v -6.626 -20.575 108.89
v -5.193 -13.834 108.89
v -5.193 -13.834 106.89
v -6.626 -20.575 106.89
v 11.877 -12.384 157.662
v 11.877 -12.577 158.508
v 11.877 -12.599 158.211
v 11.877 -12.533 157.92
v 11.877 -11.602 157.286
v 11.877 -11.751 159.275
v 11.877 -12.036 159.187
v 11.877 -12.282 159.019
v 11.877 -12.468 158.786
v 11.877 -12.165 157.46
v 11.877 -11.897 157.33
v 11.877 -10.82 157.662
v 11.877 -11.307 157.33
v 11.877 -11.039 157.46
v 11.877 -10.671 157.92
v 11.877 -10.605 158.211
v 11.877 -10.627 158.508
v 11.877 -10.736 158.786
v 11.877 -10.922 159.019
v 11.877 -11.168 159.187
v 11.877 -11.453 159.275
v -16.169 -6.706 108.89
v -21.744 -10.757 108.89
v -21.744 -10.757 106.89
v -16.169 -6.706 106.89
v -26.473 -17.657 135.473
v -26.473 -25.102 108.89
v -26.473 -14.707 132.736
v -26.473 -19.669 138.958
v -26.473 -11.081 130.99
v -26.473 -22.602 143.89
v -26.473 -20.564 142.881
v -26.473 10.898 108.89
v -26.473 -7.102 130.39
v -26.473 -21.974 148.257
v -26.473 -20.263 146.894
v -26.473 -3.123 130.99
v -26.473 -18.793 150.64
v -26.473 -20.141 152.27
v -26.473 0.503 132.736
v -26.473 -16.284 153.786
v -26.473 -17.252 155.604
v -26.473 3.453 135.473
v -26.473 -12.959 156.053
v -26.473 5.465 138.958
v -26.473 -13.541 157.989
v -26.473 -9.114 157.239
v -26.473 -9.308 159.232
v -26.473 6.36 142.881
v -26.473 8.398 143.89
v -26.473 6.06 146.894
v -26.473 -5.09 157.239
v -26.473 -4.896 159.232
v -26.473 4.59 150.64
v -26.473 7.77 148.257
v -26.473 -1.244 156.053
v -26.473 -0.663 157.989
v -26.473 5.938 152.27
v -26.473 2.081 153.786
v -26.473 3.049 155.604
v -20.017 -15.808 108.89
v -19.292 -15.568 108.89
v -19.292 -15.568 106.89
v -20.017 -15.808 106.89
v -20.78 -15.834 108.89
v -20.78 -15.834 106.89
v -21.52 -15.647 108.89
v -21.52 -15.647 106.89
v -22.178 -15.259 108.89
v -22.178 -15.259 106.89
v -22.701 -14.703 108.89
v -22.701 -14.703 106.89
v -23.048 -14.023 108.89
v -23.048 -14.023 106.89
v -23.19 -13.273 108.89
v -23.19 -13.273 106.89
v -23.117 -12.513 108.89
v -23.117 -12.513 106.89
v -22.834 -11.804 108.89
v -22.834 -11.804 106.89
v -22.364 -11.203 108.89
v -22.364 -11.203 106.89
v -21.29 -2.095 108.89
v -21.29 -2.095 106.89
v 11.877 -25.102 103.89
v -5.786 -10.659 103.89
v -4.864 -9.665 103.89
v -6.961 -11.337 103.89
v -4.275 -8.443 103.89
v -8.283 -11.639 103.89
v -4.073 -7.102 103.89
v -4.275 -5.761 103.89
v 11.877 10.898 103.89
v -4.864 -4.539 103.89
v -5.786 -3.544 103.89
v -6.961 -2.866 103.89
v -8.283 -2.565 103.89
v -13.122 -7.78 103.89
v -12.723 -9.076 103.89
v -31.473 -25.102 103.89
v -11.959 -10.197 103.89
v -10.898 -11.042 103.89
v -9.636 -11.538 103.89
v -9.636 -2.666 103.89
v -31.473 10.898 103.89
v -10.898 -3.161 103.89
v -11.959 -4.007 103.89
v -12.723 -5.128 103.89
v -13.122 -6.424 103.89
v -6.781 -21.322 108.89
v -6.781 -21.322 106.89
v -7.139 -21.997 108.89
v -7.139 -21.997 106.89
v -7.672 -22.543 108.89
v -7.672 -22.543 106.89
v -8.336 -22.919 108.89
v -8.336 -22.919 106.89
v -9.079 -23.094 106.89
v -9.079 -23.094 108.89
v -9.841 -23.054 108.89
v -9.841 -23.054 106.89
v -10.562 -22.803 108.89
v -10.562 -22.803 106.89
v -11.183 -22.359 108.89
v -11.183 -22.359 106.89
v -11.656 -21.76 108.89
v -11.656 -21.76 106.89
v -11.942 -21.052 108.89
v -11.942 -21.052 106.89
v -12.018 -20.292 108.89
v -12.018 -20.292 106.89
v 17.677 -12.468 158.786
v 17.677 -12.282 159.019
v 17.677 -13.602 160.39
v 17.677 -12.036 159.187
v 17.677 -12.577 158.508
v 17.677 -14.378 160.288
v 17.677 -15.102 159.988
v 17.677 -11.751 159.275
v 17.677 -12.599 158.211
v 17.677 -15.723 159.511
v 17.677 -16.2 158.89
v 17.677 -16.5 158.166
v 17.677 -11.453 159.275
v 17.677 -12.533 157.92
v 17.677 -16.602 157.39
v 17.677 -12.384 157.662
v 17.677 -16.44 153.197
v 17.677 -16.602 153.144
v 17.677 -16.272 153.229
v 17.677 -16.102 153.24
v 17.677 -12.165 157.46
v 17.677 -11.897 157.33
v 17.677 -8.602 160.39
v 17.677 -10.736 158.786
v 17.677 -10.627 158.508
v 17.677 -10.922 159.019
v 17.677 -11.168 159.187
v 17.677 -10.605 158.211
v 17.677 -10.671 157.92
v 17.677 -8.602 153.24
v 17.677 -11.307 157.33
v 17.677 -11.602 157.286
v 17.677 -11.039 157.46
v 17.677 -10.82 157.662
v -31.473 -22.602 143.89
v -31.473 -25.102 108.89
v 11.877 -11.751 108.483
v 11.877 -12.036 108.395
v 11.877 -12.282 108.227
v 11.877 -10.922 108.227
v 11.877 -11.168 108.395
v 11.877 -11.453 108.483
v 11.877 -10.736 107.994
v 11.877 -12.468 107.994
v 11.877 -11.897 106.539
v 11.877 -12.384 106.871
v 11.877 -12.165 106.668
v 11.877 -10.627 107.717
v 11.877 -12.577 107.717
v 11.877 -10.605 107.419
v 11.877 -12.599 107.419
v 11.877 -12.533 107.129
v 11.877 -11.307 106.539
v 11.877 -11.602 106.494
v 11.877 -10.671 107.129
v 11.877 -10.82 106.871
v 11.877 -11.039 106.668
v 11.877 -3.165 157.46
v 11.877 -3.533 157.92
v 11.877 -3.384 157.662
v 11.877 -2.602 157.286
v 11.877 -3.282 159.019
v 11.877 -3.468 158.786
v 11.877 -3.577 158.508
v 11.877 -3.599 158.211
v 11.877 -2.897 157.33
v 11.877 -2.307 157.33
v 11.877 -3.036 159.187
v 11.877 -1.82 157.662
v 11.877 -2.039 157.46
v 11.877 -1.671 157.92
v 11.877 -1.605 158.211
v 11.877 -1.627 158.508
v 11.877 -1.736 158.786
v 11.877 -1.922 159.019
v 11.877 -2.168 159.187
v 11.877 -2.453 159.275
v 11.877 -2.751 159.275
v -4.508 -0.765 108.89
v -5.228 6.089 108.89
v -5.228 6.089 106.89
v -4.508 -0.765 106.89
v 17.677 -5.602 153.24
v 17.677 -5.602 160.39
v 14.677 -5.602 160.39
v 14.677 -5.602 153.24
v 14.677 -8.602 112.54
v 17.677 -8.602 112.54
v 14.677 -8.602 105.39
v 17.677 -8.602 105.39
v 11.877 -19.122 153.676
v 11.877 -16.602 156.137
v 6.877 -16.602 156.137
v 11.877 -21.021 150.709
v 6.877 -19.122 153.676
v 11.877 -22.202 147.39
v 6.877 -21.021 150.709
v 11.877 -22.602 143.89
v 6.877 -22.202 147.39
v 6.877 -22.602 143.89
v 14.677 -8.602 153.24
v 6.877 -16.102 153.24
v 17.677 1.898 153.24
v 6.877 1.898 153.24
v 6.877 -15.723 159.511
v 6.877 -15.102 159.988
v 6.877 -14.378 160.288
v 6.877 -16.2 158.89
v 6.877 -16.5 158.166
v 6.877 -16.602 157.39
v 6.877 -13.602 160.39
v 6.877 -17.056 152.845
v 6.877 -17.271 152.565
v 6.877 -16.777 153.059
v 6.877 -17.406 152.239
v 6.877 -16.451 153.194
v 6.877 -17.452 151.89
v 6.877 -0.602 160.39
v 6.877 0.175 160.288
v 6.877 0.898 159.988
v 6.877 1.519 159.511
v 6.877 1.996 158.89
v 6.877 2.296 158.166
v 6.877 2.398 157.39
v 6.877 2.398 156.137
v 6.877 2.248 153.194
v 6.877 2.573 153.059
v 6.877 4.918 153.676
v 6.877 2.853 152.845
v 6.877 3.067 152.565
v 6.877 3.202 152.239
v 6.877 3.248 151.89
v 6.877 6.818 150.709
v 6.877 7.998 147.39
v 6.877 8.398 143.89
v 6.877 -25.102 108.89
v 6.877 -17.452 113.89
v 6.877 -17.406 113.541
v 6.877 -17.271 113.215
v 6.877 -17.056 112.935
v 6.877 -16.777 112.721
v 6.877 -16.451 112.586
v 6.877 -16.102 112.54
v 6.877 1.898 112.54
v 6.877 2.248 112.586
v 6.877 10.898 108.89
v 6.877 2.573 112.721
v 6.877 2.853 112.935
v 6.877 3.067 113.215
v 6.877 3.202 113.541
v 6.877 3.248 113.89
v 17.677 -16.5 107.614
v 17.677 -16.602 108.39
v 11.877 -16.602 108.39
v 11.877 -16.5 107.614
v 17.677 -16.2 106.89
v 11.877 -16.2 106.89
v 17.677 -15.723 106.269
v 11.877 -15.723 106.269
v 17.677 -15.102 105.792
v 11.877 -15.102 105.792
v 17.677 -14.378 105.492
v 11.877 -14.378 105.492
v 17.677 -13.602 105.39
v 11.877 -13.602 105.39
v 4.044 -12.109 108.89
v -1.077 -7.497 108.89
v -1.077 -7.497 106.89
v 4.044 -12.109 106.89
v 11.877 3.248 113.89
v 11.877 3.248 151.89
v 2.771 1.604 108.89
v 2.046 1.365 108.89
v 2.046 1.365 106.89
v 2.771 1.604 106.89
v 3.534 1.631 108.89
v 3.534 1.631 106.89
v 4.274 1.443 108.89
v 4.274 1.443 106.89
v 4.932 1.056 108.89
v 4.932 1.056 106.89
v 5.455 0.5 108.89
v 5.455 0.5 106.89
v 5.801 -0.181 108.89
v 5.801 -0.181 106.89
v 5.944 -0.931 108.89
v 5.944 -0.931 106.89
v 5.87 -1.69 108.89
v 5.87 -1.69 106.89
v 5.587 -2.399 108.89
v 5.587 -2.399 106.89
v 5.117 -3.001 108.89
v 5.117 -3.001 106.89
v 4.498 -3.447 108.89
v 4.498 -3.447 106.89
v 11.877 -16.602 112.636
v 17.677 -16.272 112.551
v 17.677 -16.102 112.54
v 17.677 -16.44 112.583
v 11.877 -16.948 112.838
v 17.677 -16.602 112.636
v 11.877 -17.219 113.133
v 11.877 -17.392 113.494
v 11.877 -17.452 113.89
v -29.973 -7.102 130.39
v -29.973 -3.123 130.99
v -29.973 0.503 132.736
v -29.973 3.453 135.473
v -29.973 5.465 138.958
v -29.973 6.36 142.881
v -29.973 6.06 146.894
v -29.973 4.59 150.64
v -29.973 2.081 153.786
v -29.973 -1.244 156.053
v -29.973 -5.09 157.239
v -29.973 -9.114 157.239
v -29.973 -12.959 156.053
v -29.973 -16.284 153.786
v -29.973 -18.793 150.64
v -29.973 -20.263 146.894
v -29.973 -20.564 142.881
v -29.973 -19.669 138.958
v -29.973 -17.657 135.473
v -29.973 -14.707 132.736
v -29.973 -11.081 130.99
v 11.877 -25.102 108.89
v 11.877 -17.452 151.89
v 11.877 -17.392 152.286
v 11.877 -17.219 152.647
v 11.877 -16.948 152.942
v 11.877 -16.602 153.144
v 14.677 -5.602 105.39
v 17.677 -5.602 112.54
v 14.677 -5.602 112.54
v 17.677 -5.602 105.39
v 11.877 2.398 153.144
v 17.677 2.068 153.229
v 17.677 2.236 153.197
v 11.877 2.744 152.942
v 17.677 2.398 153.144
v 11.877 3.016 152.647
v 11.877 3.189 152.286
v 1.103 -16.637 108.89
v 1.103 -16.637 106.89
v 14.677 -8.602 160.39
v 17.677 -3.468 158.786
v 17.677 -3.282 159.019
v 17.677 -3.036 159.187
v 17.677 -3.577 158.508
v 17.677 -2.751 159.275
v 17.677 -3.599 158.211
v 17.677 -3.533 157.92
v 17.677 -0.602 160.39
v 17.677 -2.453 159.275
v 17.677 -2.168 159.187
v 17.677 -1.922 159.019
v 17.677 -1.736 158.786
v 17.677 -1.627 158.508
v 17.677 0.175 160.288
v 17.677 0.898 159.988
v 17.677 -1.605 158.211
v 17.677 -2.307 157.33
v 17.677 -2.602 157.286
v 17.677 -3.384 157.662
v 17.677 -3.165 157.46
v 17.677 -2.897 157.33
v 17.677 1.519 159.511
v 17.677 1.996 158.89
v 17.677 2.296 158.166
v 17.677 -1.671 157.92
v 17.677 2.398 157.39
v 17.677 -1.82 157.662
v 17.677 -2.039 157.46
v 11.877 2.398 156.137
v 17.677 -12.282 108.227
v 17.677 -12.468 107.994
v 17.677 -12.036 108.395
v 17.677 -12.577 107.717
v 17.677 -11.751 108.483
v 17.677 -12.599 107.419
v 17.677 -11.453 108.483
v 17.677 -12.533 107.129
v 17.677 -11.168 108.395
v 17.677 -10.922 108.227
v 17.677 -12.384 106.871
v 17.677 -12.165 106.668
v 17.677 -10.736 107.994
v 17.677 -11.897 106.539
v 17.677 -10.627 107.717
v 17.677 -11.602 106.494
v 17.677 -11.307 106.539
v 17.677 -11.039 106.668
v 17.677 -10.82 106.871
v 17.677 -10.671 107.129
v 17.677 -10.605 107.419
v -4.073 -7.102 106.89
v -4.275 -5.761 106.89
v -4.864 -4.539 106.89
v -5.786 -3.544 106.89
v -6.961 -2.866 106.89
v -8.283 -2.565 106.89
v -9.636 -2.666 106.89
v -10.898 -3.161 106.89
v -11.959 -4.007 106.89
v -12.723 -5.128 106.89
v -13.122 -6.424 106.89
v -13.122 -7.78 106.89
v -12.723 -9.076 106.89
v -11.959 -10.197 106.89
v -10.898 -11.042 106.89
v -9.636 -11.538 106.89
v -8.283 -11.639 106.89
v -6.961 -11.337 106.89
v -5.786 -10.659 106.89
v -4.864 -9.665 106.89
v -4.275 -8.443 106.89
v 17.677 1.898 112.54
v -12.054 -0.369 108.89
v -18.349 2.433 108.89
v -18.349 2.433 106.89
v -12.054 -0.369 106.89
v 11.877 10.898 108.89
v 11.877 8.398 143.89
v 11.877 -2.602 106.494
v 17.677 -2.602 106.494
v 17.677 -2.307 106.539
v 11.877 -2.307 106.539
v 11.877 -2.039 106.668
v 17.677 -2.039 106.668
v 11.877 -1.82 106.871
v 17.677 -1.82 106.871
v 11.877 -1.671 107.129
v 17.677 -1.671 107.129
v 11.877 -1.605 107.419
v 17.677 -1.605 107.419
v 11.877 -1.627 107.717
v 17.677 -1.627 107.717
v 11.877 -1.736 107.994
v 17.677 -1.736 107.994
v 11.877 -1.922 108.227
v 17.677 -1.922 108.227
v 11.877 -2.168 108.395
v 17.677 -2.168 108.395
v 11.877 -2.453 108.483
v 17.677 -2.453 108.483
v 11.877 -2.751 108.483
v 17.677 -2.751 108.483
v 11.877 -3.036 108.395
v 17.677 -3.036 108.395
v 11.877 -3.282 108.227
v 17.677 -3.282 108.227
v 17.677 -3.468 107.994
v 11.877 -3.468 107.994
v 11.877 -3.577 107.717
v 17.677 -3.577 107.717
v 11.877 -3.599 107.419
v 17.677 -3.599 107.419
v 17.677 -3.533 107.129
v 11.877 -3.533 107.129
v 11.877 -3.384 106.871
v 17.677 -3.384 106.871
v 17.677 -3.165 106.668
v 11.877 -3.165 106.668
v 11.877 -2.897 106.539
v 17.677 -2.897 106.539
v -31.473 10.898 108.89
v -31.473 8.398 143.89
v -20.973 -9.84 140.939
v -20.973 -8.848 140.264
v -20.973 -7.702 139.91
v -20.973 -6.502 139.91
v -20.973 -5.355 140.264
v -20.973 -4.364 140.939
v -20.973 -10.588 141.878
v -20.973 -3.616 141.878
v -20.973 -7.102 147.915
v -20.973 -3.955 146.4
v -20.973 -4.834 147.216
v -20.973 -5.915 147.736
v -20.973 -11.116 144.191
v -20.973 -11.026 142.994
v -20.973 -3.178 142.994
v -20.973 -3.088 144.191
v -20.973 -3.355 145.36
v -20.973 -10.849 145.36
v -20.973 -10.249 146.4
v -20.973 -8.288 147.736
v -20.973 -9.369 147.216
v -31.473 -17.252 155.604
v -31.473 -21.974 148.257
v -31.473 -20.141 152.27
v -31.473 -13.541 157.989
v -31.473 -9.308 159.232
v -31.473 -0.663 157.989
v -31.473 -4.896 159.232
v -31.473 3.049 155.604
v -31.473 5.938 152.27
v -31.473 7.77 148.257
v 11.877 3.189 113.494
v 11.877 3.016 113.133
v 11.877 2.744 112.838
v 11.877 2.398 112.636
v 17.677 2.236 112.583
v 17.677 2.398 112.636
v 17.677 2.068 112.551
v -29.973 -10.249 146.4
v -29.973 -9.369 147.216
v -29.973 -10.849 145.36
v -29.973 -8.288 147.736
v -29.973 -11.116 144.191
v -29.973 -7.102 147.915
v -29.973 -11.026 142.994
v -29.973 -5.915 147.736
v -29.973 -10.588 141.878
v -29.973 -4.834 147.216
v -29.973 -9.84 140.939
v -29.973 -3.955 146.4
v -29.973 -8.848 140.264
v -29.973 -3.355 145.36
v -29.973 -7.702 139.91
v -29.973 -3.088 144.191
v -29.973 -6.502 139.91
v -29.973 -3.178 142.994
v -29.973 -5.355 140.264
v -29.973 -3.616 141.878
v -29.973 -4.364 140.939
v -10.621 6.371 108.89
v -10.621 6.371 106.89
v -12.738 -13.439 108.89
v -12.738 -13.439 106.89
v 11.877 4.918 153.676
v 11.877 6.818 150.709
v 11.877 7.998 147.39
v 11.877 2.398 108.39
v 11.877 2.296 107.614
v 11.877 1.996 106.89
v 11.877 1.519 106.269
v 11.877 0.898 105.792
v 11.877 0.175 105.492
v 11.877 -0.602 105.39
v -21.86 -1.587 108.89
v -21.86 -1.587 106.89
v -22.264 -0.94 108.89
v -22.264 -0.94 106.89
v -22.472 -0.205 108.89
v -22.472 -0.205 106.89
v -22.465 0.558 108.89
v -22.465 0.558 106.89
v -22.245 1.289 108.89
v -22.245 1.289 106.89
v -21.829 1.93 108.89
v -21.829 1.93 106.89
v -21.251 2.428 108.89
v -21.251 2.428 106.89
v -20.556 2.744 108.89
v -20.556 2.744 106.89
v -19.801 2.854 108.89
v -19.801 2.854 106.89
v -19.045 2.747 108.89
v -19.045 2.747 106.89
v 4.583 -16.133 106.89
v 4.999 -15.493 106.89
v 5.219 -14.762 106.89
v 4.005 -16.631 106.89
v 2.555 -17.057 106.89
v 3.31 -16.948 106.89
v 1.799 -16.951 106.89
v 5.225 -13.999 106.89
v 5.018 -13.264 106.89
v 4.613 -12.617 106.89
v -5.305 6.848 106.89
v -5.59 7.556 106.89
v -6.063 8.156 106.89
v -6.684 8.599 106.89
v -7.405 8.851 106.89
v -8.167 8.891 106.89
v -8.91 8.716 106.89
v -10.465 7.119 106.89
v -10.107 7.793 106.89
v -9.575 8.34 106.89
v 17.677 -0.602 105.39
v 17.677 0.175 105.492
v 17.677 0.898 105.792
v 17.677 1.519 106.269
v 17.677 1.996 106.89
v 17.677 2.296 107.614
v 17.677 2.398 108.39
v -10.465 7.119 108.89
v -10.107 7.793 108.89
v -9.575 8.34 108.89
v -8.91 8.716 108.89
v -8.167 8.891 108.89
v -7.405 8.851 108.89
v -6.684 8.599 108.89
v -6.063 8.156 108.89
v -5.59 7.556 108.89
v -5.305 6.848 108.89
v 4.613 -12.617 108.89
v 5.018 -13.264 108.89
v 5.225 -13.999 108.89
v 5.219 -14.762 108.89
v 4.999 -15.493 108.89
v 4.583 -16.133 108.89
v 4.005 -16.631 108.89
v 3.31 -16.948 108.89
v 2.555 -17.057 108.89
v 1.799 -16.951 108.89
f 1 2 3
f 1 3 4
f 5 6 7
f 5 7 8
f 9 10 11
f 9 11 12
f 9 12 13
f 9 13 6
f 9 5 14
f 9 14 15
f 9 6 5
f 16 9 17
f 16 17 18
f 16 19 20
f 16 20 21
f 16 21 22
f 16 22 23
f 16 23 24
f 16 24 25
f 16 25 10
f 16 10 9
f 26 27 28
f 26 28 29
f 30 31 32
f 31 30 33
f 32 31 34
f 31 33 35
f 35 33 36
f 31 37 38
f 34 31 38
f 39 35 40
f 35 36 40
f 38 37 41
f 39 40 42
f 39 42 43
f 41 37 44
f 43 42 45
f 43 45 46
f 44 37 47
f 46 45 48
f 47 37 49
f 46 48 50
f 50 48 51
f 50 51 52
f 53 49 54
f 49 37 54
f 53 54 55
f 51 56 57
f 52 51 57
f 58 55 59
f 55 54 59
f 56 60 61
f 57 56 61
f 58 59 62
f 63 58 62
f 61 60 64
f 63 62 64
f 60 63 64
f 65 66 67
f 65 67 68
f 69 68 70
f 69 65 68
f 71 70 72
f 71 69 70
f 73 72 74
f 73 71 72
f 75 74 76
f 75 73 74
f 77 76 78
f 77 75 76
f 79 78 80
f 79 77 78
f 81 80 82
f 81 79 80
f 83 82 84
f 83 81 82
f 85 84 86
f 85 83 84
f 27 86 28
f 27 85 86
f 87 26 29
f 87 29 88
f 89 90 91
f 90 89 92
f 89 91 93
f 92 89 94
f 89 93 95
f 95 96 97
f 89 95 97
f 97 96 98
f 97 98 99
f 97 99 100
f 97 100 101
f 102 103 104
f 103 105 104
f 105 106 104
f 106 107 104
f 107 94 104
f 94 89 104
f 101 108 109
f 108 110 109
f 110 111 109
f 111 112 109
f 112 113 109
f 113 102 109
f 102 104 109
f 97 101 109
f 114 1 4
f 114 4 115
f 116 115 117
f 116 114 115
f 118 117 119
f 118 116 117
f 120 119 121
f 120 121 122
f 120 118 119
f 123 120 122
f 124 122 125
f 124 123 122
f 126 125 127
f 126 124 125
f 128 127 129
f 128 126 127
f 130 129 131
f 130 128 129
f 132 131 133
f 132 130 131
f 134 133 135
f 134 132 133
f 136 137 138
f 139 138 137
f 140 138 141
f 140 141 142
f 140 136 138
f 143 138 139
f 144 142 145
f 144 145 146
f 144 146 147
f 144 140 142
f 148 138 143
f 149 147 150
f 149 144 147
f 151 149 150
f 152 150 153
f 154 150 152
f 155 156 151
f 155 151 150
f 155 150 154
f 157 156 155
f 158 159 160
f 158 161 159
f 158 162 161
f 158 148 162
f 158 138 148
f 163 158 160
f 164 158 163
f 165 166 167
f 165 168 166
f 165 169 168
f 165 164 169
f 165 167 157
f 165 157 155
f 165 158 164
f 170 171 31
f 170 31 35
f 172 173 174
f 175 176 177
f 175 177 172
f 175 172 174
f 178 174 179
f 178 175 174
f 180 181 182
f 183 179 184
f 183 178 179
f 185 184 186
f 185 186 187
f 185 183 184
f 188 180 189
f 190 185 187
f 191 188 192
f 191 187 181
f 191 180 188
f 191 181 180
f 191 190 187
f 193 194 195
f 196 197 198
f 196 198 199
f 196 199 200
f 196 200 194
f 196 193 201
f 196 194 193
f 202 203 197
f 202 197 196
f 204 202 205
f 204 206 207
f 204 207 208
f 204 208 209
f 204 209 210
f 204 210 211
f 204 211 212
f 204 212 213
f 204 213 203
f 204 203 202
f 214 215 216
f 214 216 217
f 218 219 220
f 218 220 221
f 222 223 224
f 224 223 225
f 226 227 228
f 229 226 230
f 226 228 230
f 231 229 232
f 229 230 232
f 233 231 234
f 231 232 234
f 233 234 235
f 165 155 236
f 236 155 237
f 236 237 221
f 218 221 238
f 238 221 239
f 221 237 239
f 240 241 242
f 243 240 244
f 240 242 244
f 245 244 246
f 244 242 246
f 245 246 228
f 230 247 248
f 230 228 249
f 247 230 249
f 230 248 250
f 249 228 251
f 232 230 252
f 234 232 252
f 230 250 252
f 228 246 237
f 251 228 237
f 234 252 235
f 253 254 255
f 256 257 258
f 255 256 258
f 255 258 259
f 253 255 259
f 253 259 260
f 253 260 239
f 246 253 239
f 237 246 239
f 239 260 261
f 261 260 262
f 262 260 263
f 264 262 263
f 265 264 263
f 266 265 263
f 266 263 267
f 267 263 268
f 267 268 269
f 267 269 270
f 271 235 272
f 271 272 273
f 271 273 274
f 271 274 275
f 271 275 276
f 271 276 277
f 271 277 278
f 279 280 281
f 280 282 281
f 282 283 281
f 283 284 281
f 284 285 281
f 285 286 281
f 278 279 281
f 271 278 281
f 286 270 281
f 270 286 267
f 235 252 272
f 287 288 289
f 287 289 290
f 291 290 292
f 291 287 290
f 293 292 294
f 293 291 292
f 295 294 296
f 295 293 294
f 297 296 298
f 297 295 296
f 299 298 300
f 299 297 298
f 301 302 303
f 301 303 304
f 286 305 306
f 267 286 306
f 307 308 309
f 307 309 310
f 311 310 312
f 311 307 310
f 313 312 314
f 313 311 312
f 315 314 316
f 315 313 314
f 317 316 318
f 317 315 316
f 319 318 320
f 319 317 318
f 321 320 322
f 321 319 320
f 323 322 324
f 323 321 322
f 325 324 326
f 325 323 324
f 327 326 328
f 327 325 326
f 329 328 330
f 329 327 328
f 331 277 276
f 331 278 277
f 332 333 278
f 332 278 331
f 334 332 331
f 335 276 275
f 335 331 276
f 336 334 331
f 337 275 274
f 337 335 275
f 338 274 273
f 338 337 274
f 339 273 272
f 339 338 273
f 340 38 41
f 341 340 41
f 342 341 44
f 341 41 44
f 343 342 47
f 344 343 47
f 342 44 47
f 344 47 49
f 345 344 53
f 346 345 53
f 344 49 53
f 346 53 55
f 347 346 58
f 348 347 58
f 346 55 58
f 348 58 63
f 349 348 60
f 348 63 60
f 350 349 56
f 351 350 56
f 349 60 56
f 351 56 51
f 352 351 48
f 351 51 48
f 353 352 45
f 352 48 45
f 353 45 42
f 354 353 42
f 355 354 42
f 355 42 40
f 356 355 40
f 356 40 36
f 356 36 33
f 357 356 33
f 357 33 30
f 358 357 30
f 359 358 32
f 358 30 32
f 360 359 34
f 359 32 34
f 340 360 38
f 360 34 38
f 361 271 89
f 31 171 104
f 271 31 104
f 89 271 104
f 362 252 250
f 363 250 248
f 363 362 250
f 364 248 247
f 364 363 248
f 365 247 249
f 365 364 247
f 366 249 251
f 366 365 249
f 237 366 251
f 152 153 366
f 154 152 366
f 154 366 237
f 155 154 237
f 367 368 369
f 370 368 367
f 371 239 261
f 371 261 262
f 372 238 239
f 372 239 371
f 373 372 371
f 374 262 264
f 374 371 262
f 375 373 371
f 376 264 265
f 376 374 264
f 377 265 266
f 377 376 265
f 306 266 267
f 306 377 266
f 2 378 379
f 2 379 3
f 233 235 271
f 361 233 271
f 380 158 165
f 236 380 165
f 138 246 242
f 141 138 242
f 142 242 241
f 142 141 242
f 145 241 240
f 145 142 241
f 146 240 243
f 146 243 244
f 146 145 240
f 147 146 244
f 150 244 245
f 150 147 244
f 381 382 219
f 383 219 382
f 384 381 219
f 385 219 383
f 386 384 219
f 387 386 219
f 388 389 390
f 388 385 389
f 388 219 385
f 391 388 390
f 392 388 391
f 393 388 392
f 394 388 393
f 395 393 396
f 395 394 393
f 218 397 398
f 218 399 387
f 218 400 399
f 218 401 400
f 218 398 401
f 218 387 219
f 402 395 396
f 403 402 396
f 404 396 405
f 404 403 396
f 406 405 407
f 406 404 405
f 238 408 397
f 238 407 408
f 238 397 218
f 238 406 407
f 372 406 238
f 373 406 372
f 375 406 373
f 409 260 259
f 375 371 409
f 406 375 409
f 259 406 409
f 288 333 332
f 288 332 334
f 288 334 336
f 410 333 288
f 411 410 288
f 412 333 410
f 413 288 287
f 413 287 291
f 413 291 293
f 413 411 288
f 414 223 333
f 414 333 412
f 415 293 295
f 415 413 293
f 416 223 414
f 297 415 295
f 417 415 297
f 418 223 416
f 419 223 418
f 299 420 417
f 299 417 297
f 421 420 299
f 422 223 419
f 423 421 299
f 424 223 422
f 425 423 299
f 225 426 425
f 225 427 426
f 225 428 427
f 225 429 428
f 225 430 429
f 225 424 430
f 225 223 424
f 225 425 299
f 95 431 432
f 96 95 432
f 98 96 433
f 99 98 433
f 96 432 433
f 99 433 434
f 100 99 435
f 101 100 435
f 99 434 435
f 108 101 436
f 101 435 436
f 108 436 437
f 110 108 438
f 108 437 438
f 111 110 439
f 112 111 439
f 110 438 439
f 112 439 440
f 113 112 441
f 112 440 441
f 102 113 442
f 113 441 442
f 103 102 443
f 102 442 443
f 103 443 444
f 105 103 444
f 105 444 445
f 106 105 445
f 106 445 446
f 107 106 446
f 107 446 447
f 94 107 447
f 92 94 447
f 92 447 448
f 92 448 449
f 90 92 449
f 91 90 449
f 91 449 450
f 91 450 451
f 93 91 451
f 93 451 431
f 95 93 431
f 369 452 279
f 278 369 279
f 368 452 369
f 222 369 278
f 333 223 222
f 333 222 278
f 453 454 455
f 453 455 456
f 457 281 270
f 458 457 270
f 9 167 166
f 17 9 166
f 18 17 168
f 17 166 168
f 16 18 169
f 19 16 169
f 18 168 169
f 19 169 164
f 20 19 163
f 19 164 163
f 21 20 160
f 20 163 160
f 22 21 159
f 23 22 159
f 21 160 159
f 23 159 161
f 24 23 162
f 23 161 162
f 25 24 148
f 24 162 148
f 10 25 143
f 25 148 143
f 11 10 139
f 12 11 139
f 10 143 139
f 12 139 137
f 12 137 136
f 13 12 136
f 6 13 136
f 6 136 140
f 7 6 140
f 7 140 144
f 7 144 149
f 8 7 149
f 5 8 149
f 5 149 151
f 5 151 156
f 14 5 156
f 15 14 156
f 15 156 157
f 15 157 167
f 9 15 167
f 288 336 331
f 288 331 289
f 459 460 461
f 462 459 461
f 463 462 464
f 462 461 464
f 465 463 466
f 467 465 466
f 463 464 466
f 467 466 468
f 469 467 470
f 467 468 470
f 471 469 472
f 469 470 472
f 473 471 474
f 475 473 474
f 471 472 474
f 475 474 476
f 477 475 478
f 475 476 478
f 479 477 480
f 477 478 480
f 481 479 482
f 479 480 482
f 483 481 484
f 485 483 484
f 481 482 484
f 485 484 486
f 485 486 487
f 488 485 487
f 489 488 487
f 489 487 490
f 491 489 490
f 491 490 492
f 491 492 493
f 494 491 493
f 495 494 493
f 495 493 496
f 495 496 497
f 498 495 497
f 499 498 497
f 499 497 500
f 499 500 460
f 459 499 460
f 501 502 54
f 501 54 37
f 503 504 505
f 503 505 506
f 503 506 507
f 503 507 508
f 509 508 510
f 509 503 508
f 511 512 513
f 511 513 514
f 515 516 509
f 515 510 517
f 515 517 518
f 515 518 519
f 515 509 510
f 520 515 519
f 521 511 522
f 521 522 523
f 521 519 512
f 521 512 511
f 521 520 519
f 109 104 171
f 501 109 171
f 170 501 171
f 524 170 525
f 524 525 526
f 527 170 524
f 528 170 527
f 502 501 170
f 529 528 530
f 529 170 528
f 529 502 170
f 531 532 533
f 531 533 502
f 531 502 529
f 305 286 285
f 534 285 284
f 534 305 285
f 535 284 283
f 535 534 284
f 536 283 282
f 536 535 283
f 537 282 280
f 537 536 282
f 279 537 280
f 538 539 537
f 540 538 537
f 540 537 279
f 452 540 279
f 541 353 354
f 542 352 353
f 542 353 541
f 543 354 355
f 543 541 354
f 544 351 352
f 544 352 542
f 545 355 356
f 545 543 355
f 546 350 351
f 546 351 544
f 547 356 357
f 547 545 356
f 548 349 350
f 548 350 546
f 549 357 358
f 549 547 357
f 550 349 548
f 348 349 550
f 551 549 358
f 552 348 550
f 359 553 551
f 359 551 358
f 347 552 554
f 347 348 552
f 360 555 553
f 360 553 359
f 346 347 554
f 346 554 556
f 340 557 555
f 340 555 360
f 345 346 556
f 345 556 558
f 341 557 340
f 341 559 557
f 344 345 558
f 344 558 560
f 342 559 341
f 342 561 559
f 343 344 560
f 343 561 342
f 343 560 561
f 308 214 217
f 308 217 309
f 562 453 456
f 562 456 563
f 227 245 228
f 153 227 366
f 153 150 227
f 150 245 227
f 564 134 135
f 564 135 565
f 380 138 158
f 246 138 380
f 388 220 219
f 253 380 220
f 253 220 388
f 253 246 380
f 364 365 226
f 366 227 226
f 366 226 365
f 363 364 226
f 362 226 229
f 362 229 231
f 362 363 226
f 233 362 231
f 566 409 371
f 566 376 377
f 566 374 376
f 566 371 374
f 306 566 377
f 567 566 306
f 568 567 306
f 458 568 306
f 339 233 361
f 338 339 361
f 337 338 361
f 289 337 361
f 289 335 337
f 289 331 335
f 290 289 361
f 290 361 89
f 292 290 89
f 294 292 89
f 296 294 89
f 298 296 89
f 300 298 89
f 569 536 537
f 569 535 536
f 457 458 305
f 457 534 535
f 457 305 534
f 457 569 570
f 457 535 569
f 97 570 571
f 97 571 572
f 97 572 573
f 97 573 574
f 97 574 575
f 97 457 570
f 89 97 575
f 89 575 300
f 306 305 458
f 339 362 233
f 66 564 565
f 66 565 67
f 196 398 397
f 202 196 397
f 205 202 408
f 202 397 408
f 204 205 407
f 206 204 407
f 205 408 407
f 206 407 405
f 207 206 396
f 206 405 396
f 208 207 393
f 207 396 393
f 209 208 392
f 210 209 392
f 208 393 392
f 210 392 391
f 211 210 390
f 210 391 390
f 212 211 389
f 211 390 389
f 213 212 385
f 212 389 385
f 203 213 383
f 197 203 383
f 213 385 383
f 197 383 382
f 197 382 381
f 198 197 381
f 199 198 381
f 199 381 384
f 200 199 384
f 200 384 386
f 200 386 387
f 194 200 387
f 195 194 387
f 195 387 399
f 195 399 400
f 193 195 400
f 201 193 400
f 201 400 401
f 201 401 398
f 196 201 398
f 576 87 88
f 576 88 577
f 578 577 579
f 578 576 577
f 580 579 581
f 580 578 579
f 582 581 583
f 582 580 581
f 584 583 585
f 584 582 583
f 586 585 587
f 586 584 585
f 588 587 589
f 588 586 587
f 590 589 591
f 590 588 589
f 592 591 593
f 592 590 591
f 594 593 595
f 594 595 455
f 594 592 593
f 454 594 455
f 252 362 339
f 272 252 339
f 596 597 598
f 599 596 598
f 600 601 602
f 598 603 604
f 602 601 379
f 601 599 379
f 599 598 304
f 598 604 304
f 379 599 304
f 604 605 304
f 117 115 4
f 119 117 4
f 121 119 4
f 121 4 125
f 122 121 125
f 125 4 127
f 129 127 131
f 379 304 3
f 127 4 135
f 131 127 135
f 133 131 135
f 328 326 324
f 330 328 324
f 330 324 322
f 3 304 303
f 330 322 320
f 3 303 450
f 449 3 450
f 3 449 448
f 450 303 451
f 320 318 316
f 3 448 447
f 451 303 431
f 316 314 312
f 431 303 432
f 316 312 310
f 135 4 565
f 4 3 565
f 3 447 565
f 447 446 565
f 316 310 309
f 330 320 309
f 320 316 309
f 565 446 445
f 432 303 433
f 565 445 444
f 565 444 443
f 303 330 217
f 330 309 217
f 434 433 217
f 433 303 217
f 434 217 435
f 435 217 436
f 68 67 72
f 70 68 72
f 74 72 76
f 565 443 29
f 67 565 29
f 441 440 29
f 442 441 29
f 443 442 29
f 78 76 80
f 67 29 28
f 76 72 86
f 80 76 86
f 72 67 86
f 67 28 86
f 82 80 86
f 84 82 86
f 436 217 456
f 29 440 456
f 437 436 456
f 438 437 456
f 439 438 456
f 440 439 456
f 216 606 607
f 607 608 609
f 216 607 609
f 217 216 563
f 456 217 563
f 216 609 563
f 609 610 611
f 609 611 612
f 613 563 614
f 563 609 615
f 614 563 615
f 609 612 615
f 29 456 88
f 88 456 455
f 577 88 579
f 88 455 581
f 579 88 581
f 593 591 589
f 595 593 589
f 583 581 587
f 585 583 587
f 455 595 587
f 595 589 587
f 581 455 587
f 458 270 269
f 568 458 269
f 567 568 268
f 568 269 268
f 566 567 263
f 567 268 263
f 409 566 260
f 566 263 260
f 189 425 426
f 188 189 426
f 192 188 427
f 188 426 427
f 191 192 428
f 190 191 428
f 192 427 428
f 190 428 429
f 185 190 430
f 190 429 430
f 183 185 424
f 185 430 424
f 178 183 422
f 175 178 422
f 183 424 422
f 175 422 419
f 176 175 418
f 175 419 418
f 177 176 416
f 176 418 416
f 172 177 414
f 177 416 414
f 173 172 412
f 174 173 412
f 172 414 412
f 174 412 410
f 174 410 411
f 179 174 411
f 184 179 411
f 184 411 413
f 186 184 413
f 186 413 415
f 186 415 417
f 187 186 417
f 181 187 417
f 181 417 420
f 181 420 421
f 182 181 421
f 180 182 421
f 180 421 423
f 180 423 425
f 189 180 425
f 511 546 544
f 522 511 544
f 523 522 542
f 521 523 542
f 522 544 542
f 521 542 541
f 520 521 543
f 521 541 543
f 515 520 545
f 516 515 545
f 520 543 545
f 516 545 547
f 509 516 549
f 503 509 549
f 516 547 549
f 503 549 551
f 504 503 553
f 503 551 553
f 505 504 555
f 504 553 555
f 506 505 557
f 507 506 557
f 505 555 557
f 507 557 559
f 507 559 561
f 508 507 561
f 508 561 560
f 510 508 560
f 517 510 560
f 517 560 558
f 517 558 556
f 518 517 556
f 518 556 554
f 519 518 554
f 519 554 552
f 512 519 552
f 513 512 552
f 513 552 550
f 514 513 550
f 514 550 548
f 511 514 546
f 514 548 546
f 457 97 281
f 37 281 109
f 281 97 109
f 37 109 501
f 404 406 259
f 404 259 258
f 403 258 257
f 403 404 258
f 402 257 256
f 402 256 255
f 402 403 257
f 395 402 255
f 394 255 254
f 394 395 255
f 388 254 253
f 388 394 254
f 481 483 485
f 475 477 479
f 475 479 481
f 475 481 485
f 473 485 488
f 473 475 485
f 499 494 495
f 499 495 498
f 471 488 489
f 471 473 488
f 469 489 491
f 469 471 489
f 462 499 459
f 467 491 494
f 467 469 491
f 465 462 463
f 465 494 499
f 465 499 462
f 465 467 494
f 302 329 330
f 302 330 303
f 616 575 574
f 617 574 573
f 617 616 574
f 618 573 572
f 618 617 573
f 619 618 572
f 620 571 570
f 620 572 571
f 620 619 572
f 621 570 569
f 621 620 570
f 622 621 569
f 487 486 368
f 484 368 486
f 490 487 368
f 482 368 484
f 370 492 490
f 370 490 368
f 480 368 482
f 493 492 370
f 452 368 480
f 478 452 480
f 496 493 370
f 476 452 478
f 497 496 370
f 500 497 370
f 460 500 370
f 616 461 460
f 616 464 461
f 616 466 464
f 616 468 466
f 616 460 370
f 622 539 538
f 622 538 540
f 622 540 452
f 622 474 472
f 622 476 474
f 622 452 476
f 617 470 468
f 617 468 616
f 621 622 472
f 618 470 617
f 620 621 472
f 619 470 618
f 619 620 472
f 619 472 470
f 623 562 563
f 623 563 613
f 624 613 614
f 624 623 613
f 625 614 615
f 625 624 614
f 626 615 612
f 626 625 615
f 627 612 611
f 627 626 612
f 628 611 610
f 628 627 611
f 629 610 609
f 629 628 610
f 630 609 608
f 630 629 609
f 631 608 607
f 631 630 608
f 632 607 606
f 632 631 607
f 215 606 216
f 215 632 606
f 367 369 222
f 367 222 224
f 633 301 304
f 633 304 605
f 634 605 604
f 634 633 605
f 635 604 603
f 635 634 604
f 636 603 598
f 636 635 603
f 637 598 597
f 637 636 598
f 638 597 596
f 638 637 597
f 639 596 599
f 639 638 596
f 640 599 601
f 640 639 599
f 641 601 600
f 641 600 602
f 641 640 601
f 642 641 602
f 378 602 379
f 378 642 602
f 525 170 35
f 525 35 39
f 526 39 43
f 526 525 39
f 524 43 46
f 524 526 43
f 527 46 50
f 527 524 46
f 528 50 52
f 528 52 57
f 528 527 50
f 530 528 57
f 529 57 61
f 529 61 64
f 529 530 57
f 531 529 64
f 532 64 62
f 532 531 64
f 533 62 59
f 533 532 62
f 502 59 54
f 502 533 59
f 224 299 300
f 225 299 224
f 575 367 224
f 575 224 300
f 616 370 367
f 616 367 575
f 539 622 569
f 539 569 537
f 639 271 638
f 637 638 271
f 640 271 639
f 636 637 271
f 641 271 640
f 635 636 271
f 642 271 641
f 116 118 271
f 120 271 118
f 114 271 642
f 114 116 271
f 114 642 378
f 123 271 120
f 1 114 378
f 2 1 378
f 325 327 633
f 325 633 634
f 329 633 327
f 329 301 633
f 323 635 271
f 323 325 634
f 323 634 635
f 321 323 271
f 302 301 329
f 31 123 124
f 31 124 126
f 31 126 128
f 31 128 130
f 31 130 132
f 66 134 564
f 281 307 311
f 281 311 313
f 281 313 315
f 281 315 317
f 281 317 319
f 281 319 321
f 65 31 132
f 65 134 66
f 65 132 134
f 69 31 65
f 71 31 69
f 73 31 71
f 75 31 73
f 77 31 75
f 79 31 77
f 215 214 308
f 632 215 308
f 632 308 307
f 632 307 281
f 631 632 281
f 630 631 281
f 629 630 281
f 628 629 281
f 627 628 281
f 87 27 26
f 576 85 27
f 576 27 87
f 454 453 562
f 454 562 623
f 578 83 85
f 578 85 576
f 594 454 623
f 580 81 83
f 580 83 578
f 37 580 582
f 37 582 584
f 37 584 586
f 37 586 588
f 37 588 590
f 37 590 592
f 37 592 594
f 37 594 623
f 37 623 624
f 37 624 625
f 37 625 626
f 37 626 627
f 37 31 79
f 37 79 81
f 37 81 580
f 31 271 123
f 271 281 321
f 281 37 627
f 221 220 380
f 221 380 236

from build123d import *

# Parameters (mm, degrees)
SALIENTE_EXTRUIR1_START = 2.5
SALIENTE_EXTRUIR1_DEPTH = 5
CROQUIS2_R              = 13.5
CORTAR_EXTRUIR1_DEPTH   = 3.5
CROQUIS4_R              = 4.025
SALIENTE_EXTRUIR3_DEPTH = 9
CROQUIS5_W              = 5
CROQUIS5_H              = 36
SALIENTE_EXTRUIR4_DEPTH = 38.35
CORTAR_EXTRUIR2_DEPTH   = 2
CROQUIS8_R              = 4.55
CORTAR_EXTRUIR3_DEPTH   = 67.15821583
SALIENTE_EXTRUIR5_DEPTH = 5
CORTAR_EXTRUIR4_DEPTH   = 5
SALIENTE_EXTRUIR6_START = 3.65
CROQUIS12_R             = 1
SALIENTE_EXTRUIR6_DEPTH = 3.65
SALIENTE_EXTRUIR7_START = -8.65
SALIENTE_EXTRUIR7_DEPTH = 8.65
CROQUIS14_R             = 1
CORTAR_EXTRUIR5_DEPTH   = 3.65
CROQUIS15_W             = 7.15
CROQUIS15_H             = 2.35
CORTAR_EXTRUIR6_DEPTH   = 2
CROQUIS16_W             = 7.15
CROQUIS16_H             = 2.35
SALIENTE_EXTRUIR8_DEPTH = 2
SALIENTE_EXTRUIR9_START = 2.15
CROQUIS17_R             = 1
SALIENTE_EXTRUIR9_DEPTH = 2.15
CROQUIS18_W             = 55
CROQUIS18_H             = 3
CORTAR_EXTRUIR7_DEPTH   = 3


with BuildPart() as part:
    # Croquis1 → Saliente-Extruir1 (new body)
    with BuildSketch(Plane.ZY.offset(28.973126084).offset(SALIENTE_EXTRUIR1_START)):
        with BuildLine():
            Line((108.890000566, 10.898170258), (108.890000566, -25.101829742))
            Line((108.890000566, -25.101829742), (143.890000566, -22.601829742))
            ThreePointArc((143.890000566, -22.601829742), (159.390000566, -7.101829742), (143.890000566, 8.398170258))
            Line((143.890000566, 8.398170258), (108.890000566, 10.898170258))
        make_face()
    extrude(amount=-SALIENTE_EXTRUIR1_DEPTH)

    # Croquis2 → Cortar-Extruir1 (cut)
    with BuildSketch(Plane(origin=(-26.473126084, 0, 0), x_dir=(0, 0, -1), z_dir=(1, 0, 0))):
        with Locations((-143.890000566, -7.101829742)):
            Circle(CROQUIS2_R)
    extrude(amount=-CORTAR_EXTRUIR1_DEPTH, mode=Mode.SUBTRACT)

    # Croquis4 → Saliente-Extruir3 (add)
    with BuildSketch(Plane(origin=(-29.973126084, 0, 0), x_dir=(0, 0, -1), z_dir=(1, 0, 0))):
        with Locations(Location((-143.890000566, -7.101829742, 0), (0, 0, 180))):
            Circle(CROQUIS4_R)
    extrude(amount=SALIENTE_EXTRUIR3_DEPTH)

    # Croquis5 → Saliente-Extruir4 (add)
    with BuildSketch(Plane.ZY.offset(31.473126084)):
        with Locations((106.390000566, -7.101829742)):
            Rectangle(CROQUIS5_W, CROQUIS5_H)
    extrude(amount=-SALIENTE_EXTRUIR4_DEPTH)

    # Croquis6 → Cortar-Extruir2 (cut)
    with BuildSketch(Plane.XY.offset(108.890000566)):
        with BuildLine():
            Line((-21.743906953, -10.757089493), (-16.168906615, -6.706372141))
            Line((-16.168906615, -6.706372141), (-21.289951258, -2.095098824))
            ThreePointArc((-21.289951258, -2.095098824), (-22.060016072, 1.624188646), (-18.349064321, 2.433469933))
            Line((-18.349064321, 2.433469933), (-12.053540021, -0.36926331))
            Line((-12.053540021, -0.36926331), (-10.620582506, 6.371328103))
            ThreePointArc((-10.620582506, 6.371328103), (-7.784617481, 8.89786753), (-5.228283452, 6.088729685))
            Line((-5.228283452, 6.088729685), (-4.50775949, -0.764720911))
            Line((-4.50775949, -0.764720911), (2.046242668, 1.364597186))
            ThreePointArc((2.046242668, 1.364597186), (5.652272507, 0.171849142), (4.497654785, -3.44656999))
            Line((4.497654785, -3.44656999), (-1.077345553, -7.497287342))
            Line((-1.077345553, -7.497287342), (4.04369909, -12.108560659))
            ThreePointArc((4.04369909, -12.108560659), (4.813763904, -15.827848129), (1.102812153, -16.637129416))
            Line((1.102812153, -16.637129416), (-5.192712147, -13.834396173))
            Line((-5.192712147, -13.834396173), (-6.625669661, -20.574987586))
            ThreePointArc((-6.625669661, -20.574987586), (-9.461634687, -23.101527013), (-12.017968716, -20.292389168))
            Line((-12.017968716, -20.292389168), (-12.738492677, -13.438938572))
            Line((-12.738492677, -13.438938572), (-19.292494835, -15.568256669))
            ThreePointArc((-19.292494835, -15.568256669), (-22.898524675, -14.375508625), (-21.743906953, -10.757089493))
        make_face()
    extrude(amount=-CORTAR_EXTRUIR2_DEPTH, mode=Mode.SUBTRACT)

    # Croquis8 → Cortar-Extruir3 (cut, through all)
    with BuildSketch(Plane.XY.offset(106.890000566)):
        with Locations((-8.623126084, -7.101829742)):
            Circle(CROQUIS8_R)
    extrude(amount=-CORTAR_EXTRUIR3_DEPTH, mode=Mode.SUBTRACT)

    # Croquis9 → Saliente-Extruir5 (add)
    with BuildSketch(Plane(origin=(6.876873916, 0, 0), x_dir=(0, 0, -1), z_dir=(1, 0, 0))):
        with BuildLine():
            Line((-143.890000566, -22.601829742), (-108.890000566, -25.101829742))
            Line((-108.890000566, -25.101829742), (-103.890000566, -25.101829742))
            Line((-103.890000566, -25.101829742), (-103.890000566, 10.898170258))
            Line((-103.890000566, 10.898170258), (-108.890000566, 10.898170258))
            Line((-108.890000566, 10.898170258), (-143.890000566, 8.398170258))
            ThreePointArc((-143.890000566, 8.398170258), (-159.390000566, -7.101829742), (-143.890000566, -22.601829742))
        make_face()
    extrude(amount=SALIENTE_EXTRUIR5_DEPTH)

    # Croquis11 → Cortar-Extruir4 (cut)
    with BuildSketch(Plane(origin=(11.876873916, 0, 0), x_dir=(0, 0, -1), z_dir=(1, 0, 0))):
        with BuildLine():
            Line((-153.240000566, 1.898170258), (-153.240000566, -16.101829742))
            ThreePointArc((-153.240000566, -16.101829742), (-152.844594721, -17.056423896), (-151.890000566, -17.451829742))
            Line((-151.890000566, -17.451829742), (-113.890000566, -17.451829742))
            ThreePointArc((-113.890000566, -17.451829742), (-112.935406411, -17.056423896), (-112.540000566, -16.101829742))
            Line((-112.540000566, -16.101829742), (-112.540000566, 1.898170258))
            ThreePointArc((-112.540000566, 1.898170258), (-112.935406411, 2.852764413), (-113.890000566, 3.248170258))
            Line((-113.890000566, 3.248170258), (-151.890000566, 3.248170258))
            ThreePointArc((-151.890000566, 3.248170258), (-152.844594721, 2.852764413), (-153.240000566, 1.898170258))
        make_face()
    extrude(amount=-CORTAR_EXTRUIR4_DEPTH, mode=Mode.SUBTRACT)

    # Croquis12 → Saliente-Extruir6 (add)
    with BuildSketch(Plane(origin=(11.876873916, 0, 0), x_dir=(0, 0, -1), z_dir=(1, 0, 0)).offset(SALIENTE_EXTRUIR6_START)):
        with BuildLine():
            Line((-105.390000566, -1.251829742), (-105.390000566, -3.951829742))
            Line((-105.390000566, -3.951829742), (-105.390000566, -10.251829742))
            Line((-105.390000566, -10.251829742), (-105.390000566, -12.951829742))
            Line((-105.390000566, -12.951829742), (-105.390000566, -13.601829742))
            ThreePointArc((-105.390000566, -13.601829742), (-106.268680223, -15.723150085), (-108.390000566, -16.601829742))
            Line((-108.390000566, -16.601829742), (-112.636006946, -16.601829742))
            ThreePointArc((-112.636006946, -16.601829742), (-112.564219402, -16.356396641), (-112.540000566, -16.101829742))
            Line((-112.540000566, -16.101829742), (-112.540000566, 1.898170258))
            ThreePointArc((-112.540000566, 1.898170258), (-112.564219402, 2.152737158), (-112.636006946, 2.398170258))
            Line((-112.636006946, 2.398170258), (-108.390000566, 2.398170258))
            ThreePointArc((-108.390000566, 2.398170258), (-106.268680223, 1.519490602), (-105.390000566, -0.601829742))
            Line((-105.390000566, -0.601829742), (-105.390000566, -1.251829742))
        make_face()
        with Locations((-107.494163107, -2.601829742)):
            Circle(CROQUIS12_R, mode=Mode.SUBTRACT)
        with Locations((-107.494163107, -11.601829742)):
            Circle(CROQUIS12_R, mode=Mode.SUBTRACT)
    extrude(amount=-SALIENTE_EXTRUIR6_DEPTH)

    # Croquis13 → Saliente-Extruir7 (add)
    with BuildSketch(Plane.ZY.offset(-6.876873916).offset(SALIENTE_EXTRUIR7_START)):
        with BuildLine():
            Line((153.240000566, -16.101829742), (153.240000566, 1.898170258))
            ThreePointArc((153.240000566, 1.898170258), (153.21578173, 2.152737158), (153.143994186, 2.398170258))
            Line((153.143994186, 2.398170258), (157.390000566, 2.398170258))
            ThreePointArc((157.390000566, 2.398170258), (159.51132091, 1.519490602), (160.390000566, -0.601829742))
            Line((160.390000566, -0.601829742), (160.390000566, -1.251829742))
            Line((160.390000566, -1.251829742), (160.390000566, -3.951829742))
            Line((160.390000566, -3.951829742), (160.390000566, -10.251829742))
            Line((160.390000566, -10.251829742), (160.390000566, -12.951829742))
            Line((160.390000566, -12.951829742), (160.390000566, -13.601829742))
            ThreePointArc((160.390000566, -13.601829742), (159.51132091, -15.723150085), (157.390000566, -16.601829742))
            Line((157.390000566, -16.601829742), (153.143994186, -16.601829742))
            ThreePointArc((153.143994186, -16.601829742), (153.21578173, -16.356396641), (153.240000566, -16.101829742))
        make_face()
    extrude(amount=SALIENTE_EXTRUIR7_DEPTH)

    # Croquis14 → Cortar-Extruir5 (cut)
    with BuildSketch(Plane(origin=(15.526873916, 0, 0), x_dir=(0, 0, -1), z_dir=(1, 0, 0))):
        with Locations((-158.285838025, -2.601829742)):
            Circle(CROQUIS14_R)
        with Locations((-158.285838025, -11.601829742)):
            Circle(CROQUIS14_R)
    extrude(amount=-CORTAR_EXTRUIR5_DEPTH, mode=Mode.SUBTRACT)

    # Croquis15 → Cortar-Extruir6 (cut)
    with BuildSketch(Plane(origin=(15.526873916, 0, 0), x_dir=(0, 0, -1), z_dir=(1, 0, 0))):
        with Locations((-108.965000566, -7.101829742)):
            Rectangle(CROQUIS15_W, CROQUIS15_H)
        with Locations((-156.815000566, -7.101829742)):
            Rectangle(CROQUIS15_W, CROQUIS15_H)
    extrude(amount=-CORTAR_EXTRUIR6_DEPTH, mode=Mode.SUBTRACT)

    # Croquis16 → Saliente-Extruir8 (add)
    with BuildSketch(Plane(origin=(13.526873916, 0, 0), x_dir=(0, 0, -1), z_dir=(1, 0, 0))):
        with Locations((-156.815000566, -7.101829742)):
            Rectangle(CROQUIS16_W, CROQUIS16_H)
        with Locations((-108.965000566, -7.101829742)):
            Rectangle(CROQUIS16_W, CROQUIS16_H)
    extrude(amount=SALIENTE_EXTRUIR8_DEPTH)

    # Croquis17 → Saliente-Extruir9 (add)
    # profile 1 of 2: a face of its own
    with BuildSketch(Plane(origin=(15.526873916, 0, 0), x_dir=(0, 0, -1), z_dir=(1, 0, 0)).offset(SALIENTE_EXTRUIR9_START)):
        with BuildLine():
            Line((-105.390000566, -13.601829742), (-105.390000566, -0.601829742))
            ThreePointArc((-105.390000566, -0.601829742), (-106.268680223, 1.519490602), (-108.390000566, 2.398170258))
            Line((-108.390000566, 2.398170258), (-112.636006946, 2.398170258))
            ThreePointArc((-112.636006946, 2.398170258), (-112.564219402, 2.152737158), (-112.540000566, 1.898170258))
            Line((-112.540000566, 1.898170258), (-112.540000566, -16.101829742))
            ThreePointArc((-112.540000566, -16.101829742), (-112.564219402, -16.356396641), (-112.636006946, -16.601829742))
            Line((-112.636006946, -16.601829742), (-108.390000566, -16.601829742))
            ThreePointArc((-108.390000566, -16.601829742), (-106.268680223, -15.723150085), (-105.390000566, -13.601829742))
        make_face()
        with Locations((-107.494163107, -11.601829742)):
            Circle(CROQUIS17_R, mode=Mode.SUBTRACT)
        with Locations((-107.494163107, -2.601829742)):
            Circle(CROQUIS17_R, mode=Mode.SUBTRACT)
    # profile 2 of 2: a face of its own
    with BuildSketch(Plane(origin=(15.526873916, 0, 0), x_dir=(0, 0, -1), z_dir=(1, 0, 0)).offset(SALIENTE_EXTRUIR9_START)):
        with BuildLine():
            Line((-160.390000566, -0.601829742), (-160.390000566, -13.601829742))
            ThreePointArc((-160.390000566, -13.601829742), (-159.51132091, -15.723150085), (-157.390000566, -16.601829742))
            Line((-157.390000566, -16.601829742), (-153.143994186, -16.601829742))
            ThreePointArc((-153.143994186, -16.601829742), (-153.21578173, -16.356396641), (-153.240000566, -16.101829742))
            Line((-153.240000566, -16.101829742), (-153.240000566, 1.898170258))
            ThreePointArc((-153.240000566, 1.898170258), (-153.21578173, 2.152737158), (-153.143994186, 2.398170258))
            Line((-153.143994186, 2.398170258), (-157.390000566, 2.398170258))
            ThreePointArc((-157.390000566, 2.398170258), (-159.51132091, 1.519490602), (-160.390000566, -0.601829742))
        make_face()
        with Locations((-158.285838025, -11.601829742)):
            Circle(CROQUIS17_R, mode=Mode.SUBTRACT)
        with Locations((-158.285838025, -2.601829742)):
            Circle(CROQUIS17_R, mode=Mode.SUBTRACT)
    extrude(amount=-SALIENTE_EXTRUIR9_DEPTH)

    # Croquis18 → Cortar-Extruir7 (cut)
    with BuildSketch(Plane(origin=(17.676873916, 0, 0), x_dir=(0, 0, -1), z_dir=(1, 0, 0))):
        with Locations((-132.890000566, -7.101829742)):
            Rectangle(CROQUIS18_W, CROQUIS18_H)
    extrude(amount=-CORTAR_EXTRUIR7_DEPTH, mode=Mode.SUBTRACT)


solid = part.part
